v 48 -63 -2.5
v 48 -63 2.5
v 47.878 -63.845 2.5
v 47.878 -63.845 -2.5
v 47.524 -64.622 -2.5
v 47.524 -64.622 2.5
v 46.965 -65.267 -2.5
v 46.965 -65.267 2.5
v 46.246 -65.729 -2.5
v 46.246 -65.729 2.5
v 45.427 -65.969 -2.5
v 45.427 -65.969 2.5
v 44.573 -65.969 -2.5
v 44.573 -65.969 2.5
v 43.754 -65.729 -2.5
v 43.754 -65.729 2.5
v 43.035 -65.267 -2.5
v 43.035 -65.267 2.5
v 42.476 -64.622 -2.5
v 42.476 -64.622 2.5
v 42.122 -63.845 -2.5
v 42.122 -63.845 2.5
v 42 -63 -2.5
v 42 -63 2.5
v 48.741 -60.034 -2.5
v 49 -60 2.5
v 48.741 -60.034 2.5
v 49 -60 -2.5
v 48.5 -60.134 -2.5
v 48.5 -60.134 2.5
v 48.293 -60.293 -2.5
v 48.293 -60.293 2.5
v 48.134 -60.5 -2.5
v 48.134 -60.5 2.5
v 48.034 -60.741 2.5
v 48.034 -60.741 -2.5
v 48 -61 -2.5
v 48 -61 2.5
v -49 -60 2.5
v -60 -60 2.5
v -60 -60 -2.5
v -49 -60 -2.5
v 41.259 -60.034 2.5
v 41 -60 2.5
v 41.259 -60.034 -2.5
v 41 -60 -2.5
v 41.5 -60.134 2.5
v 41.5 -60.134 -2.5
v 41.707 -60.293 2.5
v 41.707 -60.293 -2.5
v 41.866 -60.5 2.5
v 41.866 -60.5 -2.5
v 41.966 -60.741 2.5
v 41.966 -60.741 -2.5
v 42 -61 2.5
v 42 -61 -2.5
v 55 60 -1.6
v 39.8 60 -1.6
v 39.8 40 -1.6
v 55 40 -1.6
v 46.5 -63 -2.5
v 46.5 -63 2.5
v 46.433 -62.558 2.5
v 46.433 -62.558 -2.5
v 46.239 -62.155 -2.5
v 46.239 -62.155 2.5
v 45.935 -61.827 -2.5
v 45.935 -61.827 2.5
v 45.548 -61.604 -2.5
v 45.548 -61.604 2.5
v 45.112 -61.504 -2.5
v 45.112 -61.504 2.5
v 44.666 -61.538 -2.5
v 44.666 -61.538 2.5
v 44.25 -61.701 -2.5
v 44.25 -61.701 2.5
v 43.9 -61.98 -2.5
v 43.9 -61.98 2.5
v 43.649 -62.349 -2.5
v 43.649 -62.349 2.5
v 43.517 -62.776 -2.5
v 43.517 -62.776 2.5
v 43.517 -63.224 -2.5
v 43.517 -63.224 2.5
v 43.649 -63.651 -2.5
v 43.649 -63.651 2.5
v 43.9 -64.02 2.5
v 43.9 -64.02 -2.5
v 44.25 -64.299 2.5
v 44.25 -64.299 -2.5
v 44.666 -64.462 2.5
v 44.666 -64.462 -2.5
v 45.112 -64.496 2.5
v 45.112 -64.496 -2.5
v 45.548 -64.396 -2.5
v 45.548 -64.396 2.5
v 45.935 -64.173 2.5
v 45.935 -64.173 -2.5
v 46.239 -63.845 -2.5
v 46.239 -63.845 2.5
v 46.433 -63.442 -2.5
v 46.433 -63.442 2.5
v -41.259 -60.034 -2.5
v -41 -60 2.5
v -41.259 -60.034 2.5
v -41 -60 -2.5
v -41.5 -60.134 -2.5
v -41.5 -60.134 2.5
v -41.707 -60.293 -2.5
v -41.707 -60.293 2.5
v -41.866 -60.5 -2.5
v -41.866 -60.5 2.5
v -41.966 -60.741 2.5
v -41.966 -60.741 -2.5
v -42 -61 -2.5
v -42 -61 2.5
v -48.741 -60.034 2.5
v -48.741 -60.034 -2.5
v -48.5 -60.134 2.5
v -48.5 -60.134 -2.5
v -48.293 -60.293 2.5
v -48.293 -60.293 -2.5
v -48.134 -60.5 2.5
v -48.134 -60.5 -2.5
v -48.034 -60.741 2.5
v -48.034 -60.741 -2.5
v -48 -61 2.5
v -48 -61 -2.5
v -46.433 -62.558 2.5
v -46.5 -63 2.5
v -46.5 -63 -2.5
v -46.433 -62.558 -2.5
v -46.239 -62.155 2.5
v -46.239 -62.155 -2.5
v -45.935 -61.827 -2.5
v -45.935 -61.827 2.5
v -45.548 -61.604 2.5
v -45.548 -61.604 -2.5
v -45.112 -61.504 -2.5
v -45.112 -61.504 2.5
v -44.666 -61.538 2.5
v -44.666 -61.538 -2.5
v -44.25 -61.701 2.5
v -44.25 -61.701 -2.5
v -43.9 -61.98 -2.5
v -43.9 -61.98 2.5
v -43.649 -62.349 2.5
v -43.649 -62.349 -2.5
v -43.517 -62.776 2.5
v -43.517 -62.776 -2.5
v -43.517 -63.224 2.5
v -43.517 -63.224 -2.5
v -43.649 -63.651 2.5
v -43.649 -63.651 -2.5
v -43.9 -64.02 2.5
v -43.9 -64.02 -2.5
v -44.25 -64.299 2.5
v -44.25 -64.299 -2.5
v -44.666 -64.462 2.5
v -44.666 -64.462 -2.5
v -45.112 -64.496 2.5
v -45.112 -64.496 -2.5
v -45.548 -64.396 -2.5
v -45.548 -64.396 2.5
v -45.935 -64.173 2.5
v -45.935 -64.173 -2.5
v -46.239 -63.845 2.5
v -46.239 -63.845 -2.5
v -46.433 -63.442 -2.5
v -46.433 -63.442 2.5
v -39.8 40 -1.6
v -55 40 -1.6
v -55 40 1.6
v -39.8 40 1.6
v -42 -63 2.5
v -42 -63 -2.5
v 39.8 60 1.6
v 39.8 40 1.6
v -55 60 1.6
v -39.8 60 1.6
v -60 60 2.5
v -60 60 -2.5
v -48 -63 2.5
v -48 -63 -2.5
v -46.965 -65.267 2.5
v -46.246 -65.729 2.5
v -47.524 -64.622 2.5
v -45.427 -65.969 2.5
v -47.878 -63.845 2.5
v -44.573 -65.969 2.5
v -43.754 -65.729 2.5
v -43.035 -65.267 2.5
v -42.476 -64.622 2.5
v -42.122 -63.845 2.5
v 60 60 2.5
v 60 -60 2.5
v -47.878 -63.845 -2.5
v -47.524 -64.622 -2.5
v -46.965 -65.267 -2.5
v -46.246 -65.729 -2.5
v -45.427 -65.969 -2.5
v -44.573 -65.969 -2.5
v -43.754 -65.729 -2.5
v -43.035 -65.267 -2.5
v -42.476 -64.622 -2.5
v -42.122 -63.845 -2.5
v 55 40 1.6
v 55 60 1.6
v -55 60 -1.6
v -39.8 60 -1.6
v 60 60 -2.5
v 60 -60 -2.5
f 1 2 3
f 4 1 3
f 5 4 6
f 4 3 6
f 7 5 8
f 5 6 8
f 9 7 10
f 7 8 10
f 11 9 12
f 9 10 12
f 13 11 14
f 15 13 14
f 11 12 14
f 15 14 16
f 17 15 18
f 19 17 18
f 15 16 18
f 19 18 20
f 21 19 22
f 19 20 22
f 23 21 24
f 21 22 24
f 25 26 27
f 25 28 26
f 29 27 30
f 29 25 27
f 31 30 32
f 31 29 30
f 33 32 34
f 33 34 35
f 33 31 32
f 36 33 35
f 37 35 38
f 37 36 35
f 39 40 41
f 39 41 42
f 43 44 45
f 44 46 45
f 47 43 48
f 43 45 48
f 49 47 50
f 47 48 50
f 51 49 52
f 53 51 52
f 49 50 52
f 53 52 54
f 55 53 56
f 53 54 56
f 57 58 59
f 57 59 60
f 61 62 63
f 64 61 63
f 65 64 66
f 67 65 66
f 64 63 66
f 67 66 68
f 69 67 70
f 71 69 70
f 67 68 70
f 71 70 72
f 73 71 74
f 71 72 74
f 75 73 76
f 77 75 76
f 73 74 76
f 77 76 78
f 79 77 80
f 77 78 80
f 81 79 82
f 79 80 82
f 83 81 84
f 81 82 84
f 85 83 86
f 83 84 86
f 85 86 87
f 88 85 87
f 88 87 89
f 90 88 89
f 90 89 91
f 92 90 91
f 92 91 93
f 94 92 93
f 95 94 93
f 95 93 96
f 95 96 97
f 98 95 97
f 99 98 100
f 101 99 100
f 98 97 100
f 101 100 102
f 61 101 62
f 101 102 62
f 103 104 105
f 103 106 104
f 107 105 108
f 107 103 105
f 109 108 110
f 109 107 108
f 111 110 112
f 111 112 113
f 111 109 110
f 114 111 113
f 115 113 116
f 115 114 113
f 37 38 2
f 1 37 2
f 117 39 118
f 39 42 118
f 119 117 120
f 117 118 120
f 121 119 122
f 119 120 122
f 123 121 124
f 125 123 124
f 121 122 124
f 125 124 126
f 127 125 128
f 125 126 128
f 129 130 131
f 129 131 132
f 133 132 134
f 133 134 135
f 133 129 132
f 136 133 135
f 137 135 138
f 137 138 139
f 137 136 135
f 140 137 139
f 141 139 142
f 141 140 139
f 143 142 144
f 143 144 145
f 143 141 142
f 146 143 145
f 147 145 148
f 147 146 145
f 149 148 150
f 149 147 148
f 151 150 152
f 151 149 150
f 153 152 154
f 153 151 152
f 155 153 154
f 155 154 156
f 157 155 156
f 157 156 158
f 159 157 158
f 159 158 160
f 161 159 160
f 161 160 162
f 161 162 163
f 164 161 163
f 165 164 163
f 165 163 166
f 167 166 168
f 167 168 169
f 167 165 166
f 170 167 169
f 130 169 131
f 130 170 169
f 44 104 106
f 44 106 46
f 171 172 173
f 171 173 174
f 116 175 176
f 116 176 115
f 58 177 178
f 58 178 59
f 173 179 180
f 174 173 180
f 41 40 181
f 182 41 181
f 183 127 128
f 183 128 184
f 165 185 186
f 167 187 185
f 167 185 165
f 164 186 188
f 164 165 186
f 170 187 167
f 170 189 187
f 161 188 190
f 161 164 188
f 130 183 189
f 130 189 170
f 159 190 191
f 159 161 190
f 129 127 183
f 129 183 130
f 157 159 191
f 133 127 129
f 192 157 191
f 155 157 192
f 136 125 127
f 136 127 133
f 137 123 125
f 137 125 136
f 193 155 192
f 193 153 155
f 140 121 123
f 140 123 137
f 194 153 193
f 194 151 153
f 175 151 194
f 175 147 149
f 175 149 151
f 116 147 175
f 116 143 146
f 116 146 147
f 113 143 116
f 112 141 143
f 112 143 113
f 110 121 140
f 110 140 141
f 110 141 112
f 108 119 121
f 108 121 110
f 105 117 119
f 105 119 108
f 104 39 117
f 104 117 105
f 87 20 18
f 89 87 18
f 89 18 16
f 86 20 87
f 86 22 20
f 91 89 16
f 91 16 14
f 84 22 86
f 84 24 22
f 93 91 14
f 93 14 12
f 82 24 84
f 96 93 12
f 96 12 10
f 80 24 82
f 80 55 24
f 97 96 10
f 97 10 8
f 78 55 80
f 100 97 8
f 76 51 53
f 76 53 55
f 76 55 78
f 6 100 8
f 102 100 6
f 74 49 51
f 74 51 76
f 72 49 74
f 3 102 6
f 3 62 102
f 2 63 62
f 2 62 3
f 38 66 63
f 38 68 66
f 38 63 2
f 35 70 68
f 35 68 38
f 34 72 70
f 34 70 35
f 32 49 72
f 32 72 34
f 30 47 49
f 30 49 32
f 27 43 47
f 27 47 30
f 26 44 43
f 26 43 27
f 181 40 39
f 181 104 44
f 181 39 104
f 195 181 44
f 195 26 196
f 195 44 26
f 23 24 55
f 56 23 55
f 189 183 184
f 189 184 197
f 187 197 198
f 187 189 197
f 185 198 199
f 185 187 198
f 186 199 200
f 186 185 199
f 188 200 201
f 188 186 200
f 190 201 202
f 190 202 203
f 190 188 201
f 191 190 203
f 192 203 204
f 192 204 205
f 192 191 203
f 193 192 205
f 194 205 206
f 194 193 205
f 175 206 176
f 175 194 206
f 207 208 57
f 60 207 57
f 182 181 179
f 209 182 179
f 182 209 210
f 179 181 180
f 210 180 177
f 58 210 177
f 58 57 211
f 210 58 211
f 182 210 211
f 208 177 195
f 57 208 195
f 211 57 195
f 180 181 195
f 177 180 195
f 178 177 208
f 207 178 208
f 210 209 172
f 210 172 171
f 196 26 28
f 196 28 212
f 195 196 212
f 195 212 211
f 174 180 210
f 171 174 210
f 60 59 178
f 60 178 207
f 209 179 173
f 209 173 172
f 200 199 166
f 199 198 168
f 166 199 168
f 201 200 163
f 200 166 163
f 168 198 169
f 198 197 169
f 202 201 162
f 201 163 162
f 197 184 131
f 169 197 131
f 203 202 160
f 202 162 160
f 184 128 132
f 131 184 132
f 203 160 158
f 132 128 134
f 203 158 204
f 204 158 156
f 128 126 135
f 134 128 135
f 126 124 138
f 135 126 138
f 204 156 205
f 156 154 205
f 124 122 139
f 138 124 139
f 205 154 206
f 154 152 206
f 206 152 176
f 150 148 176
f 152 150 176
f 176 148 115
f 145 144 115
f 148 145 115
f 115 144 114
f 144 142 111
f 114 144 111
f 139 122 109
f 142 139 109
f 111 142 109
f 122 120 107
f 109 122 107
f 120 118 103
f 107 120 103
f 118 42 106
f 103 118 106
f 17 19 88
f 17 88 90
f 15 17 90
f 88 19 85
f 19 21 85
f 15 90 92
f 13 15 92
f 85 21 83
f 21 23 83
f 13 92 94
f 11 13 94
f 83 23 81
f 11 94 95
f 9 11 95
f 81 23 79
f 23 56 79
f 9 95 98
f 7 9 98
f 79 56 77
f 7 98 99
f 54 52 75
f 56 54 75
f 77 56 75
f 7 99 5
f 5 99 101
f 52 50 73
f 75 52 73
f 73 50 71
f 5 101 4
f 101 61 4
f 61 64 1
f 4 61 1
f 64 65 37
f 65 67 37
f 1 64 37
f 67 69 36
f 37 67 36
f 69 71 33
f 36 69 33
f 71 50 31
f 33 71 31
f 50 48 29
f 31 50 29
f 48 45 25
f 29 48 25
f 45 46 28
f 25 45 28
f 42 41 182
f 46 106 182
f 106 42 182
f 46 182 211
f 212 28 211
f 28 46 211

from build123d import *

# Parameters (mm, degrees)
SKETCH1_W            = 120
SKETCH1_H            = 120
BOSS_EXTRUDE1_DEPTH  = 2.5
SKETCH4_W            = 15.2
SKETCH4_H            = 3.2
CUT_EXTRUDE1_DEPTH   = 20
SKETCH6_R            = 1.5
BOSS_EXTRUDE2_DEPTH  = 5
FILLET1_R            = 1
FILLET1_OF_MIRROR1_R = 1


with BuildPart() as part:
    # Sketch1 → Boss-Extrude1 (new body, symmetric)
    with BuildSketch(Plane.XY):
        Rectangle(SKETCH1_W, SKETCH1_H)
    extrude(amount=BOSS_EXTRUDE1_DEPTH, both=True)

    # Sketch4 → Cut-Extrude1 (cut)
    with BuildSketch(Plane(origin=(0, 60, 0), x_dir=(1, 0, 0), z_dir=(0, 1, 0))):
        with Locations((-47.4, 0)):
            Rectangle(SKETCH4_W, SKETCH4_H)
        with Locations((47.4, 0)):
            Rectangle(SKETCH4_W, SKETCH4_H)
    extrude(amount=-CUT_EXTRUDE1_DEPTH, mode=Mode.SUBTRACT)

    # Sketch6 → Boss-Extrude2 (add)
    with BuildSketch(Plane.XY.offset(2.5)):
        with BuildLine():
            Line((42, -60), (48, -60))
            Line((48, -60), (48, -63))
            ThreePointArc((48, -63), (45, -66), (42, -63))
            Line((42, -63), (42, -60))
        make_face()
        with Locations((45, -63)):
            Circle(SKETCH6_R, mode=Mode.SUBTRACT)
    boss_extrude2 = extrude(amount=-BOSS_EXTRUDE2_DEPTH)

    # Fillet1
    fillet1_edges = [part.edges().sort_by_distance(p)[0] for p in [
        (42, -60, 0),
        (48, -60, 0),
    ]]
    fillet(fillet1_edges, radius=FILLET1_R)

    # Mirror1: Boss-Extrude2 across plane
    add(boss_extrude2.mirror(Plane(origin=(0, 0, 0), x_dir=(0, 0, 1), z_dir=(1, 0, 0))))

    # Fillet1 of Mirror1
    fillet1_of_mirror1_edges = [part.edges().sort_by_distance(p)[0] for p in [
        (-42, -60, 0),
        (-48, -60, 0),
    ]]
    fillet(fillet1_of_mirror1_edges, radius=FILLET1_OF_MIRROR1_R)


solid = part.part
